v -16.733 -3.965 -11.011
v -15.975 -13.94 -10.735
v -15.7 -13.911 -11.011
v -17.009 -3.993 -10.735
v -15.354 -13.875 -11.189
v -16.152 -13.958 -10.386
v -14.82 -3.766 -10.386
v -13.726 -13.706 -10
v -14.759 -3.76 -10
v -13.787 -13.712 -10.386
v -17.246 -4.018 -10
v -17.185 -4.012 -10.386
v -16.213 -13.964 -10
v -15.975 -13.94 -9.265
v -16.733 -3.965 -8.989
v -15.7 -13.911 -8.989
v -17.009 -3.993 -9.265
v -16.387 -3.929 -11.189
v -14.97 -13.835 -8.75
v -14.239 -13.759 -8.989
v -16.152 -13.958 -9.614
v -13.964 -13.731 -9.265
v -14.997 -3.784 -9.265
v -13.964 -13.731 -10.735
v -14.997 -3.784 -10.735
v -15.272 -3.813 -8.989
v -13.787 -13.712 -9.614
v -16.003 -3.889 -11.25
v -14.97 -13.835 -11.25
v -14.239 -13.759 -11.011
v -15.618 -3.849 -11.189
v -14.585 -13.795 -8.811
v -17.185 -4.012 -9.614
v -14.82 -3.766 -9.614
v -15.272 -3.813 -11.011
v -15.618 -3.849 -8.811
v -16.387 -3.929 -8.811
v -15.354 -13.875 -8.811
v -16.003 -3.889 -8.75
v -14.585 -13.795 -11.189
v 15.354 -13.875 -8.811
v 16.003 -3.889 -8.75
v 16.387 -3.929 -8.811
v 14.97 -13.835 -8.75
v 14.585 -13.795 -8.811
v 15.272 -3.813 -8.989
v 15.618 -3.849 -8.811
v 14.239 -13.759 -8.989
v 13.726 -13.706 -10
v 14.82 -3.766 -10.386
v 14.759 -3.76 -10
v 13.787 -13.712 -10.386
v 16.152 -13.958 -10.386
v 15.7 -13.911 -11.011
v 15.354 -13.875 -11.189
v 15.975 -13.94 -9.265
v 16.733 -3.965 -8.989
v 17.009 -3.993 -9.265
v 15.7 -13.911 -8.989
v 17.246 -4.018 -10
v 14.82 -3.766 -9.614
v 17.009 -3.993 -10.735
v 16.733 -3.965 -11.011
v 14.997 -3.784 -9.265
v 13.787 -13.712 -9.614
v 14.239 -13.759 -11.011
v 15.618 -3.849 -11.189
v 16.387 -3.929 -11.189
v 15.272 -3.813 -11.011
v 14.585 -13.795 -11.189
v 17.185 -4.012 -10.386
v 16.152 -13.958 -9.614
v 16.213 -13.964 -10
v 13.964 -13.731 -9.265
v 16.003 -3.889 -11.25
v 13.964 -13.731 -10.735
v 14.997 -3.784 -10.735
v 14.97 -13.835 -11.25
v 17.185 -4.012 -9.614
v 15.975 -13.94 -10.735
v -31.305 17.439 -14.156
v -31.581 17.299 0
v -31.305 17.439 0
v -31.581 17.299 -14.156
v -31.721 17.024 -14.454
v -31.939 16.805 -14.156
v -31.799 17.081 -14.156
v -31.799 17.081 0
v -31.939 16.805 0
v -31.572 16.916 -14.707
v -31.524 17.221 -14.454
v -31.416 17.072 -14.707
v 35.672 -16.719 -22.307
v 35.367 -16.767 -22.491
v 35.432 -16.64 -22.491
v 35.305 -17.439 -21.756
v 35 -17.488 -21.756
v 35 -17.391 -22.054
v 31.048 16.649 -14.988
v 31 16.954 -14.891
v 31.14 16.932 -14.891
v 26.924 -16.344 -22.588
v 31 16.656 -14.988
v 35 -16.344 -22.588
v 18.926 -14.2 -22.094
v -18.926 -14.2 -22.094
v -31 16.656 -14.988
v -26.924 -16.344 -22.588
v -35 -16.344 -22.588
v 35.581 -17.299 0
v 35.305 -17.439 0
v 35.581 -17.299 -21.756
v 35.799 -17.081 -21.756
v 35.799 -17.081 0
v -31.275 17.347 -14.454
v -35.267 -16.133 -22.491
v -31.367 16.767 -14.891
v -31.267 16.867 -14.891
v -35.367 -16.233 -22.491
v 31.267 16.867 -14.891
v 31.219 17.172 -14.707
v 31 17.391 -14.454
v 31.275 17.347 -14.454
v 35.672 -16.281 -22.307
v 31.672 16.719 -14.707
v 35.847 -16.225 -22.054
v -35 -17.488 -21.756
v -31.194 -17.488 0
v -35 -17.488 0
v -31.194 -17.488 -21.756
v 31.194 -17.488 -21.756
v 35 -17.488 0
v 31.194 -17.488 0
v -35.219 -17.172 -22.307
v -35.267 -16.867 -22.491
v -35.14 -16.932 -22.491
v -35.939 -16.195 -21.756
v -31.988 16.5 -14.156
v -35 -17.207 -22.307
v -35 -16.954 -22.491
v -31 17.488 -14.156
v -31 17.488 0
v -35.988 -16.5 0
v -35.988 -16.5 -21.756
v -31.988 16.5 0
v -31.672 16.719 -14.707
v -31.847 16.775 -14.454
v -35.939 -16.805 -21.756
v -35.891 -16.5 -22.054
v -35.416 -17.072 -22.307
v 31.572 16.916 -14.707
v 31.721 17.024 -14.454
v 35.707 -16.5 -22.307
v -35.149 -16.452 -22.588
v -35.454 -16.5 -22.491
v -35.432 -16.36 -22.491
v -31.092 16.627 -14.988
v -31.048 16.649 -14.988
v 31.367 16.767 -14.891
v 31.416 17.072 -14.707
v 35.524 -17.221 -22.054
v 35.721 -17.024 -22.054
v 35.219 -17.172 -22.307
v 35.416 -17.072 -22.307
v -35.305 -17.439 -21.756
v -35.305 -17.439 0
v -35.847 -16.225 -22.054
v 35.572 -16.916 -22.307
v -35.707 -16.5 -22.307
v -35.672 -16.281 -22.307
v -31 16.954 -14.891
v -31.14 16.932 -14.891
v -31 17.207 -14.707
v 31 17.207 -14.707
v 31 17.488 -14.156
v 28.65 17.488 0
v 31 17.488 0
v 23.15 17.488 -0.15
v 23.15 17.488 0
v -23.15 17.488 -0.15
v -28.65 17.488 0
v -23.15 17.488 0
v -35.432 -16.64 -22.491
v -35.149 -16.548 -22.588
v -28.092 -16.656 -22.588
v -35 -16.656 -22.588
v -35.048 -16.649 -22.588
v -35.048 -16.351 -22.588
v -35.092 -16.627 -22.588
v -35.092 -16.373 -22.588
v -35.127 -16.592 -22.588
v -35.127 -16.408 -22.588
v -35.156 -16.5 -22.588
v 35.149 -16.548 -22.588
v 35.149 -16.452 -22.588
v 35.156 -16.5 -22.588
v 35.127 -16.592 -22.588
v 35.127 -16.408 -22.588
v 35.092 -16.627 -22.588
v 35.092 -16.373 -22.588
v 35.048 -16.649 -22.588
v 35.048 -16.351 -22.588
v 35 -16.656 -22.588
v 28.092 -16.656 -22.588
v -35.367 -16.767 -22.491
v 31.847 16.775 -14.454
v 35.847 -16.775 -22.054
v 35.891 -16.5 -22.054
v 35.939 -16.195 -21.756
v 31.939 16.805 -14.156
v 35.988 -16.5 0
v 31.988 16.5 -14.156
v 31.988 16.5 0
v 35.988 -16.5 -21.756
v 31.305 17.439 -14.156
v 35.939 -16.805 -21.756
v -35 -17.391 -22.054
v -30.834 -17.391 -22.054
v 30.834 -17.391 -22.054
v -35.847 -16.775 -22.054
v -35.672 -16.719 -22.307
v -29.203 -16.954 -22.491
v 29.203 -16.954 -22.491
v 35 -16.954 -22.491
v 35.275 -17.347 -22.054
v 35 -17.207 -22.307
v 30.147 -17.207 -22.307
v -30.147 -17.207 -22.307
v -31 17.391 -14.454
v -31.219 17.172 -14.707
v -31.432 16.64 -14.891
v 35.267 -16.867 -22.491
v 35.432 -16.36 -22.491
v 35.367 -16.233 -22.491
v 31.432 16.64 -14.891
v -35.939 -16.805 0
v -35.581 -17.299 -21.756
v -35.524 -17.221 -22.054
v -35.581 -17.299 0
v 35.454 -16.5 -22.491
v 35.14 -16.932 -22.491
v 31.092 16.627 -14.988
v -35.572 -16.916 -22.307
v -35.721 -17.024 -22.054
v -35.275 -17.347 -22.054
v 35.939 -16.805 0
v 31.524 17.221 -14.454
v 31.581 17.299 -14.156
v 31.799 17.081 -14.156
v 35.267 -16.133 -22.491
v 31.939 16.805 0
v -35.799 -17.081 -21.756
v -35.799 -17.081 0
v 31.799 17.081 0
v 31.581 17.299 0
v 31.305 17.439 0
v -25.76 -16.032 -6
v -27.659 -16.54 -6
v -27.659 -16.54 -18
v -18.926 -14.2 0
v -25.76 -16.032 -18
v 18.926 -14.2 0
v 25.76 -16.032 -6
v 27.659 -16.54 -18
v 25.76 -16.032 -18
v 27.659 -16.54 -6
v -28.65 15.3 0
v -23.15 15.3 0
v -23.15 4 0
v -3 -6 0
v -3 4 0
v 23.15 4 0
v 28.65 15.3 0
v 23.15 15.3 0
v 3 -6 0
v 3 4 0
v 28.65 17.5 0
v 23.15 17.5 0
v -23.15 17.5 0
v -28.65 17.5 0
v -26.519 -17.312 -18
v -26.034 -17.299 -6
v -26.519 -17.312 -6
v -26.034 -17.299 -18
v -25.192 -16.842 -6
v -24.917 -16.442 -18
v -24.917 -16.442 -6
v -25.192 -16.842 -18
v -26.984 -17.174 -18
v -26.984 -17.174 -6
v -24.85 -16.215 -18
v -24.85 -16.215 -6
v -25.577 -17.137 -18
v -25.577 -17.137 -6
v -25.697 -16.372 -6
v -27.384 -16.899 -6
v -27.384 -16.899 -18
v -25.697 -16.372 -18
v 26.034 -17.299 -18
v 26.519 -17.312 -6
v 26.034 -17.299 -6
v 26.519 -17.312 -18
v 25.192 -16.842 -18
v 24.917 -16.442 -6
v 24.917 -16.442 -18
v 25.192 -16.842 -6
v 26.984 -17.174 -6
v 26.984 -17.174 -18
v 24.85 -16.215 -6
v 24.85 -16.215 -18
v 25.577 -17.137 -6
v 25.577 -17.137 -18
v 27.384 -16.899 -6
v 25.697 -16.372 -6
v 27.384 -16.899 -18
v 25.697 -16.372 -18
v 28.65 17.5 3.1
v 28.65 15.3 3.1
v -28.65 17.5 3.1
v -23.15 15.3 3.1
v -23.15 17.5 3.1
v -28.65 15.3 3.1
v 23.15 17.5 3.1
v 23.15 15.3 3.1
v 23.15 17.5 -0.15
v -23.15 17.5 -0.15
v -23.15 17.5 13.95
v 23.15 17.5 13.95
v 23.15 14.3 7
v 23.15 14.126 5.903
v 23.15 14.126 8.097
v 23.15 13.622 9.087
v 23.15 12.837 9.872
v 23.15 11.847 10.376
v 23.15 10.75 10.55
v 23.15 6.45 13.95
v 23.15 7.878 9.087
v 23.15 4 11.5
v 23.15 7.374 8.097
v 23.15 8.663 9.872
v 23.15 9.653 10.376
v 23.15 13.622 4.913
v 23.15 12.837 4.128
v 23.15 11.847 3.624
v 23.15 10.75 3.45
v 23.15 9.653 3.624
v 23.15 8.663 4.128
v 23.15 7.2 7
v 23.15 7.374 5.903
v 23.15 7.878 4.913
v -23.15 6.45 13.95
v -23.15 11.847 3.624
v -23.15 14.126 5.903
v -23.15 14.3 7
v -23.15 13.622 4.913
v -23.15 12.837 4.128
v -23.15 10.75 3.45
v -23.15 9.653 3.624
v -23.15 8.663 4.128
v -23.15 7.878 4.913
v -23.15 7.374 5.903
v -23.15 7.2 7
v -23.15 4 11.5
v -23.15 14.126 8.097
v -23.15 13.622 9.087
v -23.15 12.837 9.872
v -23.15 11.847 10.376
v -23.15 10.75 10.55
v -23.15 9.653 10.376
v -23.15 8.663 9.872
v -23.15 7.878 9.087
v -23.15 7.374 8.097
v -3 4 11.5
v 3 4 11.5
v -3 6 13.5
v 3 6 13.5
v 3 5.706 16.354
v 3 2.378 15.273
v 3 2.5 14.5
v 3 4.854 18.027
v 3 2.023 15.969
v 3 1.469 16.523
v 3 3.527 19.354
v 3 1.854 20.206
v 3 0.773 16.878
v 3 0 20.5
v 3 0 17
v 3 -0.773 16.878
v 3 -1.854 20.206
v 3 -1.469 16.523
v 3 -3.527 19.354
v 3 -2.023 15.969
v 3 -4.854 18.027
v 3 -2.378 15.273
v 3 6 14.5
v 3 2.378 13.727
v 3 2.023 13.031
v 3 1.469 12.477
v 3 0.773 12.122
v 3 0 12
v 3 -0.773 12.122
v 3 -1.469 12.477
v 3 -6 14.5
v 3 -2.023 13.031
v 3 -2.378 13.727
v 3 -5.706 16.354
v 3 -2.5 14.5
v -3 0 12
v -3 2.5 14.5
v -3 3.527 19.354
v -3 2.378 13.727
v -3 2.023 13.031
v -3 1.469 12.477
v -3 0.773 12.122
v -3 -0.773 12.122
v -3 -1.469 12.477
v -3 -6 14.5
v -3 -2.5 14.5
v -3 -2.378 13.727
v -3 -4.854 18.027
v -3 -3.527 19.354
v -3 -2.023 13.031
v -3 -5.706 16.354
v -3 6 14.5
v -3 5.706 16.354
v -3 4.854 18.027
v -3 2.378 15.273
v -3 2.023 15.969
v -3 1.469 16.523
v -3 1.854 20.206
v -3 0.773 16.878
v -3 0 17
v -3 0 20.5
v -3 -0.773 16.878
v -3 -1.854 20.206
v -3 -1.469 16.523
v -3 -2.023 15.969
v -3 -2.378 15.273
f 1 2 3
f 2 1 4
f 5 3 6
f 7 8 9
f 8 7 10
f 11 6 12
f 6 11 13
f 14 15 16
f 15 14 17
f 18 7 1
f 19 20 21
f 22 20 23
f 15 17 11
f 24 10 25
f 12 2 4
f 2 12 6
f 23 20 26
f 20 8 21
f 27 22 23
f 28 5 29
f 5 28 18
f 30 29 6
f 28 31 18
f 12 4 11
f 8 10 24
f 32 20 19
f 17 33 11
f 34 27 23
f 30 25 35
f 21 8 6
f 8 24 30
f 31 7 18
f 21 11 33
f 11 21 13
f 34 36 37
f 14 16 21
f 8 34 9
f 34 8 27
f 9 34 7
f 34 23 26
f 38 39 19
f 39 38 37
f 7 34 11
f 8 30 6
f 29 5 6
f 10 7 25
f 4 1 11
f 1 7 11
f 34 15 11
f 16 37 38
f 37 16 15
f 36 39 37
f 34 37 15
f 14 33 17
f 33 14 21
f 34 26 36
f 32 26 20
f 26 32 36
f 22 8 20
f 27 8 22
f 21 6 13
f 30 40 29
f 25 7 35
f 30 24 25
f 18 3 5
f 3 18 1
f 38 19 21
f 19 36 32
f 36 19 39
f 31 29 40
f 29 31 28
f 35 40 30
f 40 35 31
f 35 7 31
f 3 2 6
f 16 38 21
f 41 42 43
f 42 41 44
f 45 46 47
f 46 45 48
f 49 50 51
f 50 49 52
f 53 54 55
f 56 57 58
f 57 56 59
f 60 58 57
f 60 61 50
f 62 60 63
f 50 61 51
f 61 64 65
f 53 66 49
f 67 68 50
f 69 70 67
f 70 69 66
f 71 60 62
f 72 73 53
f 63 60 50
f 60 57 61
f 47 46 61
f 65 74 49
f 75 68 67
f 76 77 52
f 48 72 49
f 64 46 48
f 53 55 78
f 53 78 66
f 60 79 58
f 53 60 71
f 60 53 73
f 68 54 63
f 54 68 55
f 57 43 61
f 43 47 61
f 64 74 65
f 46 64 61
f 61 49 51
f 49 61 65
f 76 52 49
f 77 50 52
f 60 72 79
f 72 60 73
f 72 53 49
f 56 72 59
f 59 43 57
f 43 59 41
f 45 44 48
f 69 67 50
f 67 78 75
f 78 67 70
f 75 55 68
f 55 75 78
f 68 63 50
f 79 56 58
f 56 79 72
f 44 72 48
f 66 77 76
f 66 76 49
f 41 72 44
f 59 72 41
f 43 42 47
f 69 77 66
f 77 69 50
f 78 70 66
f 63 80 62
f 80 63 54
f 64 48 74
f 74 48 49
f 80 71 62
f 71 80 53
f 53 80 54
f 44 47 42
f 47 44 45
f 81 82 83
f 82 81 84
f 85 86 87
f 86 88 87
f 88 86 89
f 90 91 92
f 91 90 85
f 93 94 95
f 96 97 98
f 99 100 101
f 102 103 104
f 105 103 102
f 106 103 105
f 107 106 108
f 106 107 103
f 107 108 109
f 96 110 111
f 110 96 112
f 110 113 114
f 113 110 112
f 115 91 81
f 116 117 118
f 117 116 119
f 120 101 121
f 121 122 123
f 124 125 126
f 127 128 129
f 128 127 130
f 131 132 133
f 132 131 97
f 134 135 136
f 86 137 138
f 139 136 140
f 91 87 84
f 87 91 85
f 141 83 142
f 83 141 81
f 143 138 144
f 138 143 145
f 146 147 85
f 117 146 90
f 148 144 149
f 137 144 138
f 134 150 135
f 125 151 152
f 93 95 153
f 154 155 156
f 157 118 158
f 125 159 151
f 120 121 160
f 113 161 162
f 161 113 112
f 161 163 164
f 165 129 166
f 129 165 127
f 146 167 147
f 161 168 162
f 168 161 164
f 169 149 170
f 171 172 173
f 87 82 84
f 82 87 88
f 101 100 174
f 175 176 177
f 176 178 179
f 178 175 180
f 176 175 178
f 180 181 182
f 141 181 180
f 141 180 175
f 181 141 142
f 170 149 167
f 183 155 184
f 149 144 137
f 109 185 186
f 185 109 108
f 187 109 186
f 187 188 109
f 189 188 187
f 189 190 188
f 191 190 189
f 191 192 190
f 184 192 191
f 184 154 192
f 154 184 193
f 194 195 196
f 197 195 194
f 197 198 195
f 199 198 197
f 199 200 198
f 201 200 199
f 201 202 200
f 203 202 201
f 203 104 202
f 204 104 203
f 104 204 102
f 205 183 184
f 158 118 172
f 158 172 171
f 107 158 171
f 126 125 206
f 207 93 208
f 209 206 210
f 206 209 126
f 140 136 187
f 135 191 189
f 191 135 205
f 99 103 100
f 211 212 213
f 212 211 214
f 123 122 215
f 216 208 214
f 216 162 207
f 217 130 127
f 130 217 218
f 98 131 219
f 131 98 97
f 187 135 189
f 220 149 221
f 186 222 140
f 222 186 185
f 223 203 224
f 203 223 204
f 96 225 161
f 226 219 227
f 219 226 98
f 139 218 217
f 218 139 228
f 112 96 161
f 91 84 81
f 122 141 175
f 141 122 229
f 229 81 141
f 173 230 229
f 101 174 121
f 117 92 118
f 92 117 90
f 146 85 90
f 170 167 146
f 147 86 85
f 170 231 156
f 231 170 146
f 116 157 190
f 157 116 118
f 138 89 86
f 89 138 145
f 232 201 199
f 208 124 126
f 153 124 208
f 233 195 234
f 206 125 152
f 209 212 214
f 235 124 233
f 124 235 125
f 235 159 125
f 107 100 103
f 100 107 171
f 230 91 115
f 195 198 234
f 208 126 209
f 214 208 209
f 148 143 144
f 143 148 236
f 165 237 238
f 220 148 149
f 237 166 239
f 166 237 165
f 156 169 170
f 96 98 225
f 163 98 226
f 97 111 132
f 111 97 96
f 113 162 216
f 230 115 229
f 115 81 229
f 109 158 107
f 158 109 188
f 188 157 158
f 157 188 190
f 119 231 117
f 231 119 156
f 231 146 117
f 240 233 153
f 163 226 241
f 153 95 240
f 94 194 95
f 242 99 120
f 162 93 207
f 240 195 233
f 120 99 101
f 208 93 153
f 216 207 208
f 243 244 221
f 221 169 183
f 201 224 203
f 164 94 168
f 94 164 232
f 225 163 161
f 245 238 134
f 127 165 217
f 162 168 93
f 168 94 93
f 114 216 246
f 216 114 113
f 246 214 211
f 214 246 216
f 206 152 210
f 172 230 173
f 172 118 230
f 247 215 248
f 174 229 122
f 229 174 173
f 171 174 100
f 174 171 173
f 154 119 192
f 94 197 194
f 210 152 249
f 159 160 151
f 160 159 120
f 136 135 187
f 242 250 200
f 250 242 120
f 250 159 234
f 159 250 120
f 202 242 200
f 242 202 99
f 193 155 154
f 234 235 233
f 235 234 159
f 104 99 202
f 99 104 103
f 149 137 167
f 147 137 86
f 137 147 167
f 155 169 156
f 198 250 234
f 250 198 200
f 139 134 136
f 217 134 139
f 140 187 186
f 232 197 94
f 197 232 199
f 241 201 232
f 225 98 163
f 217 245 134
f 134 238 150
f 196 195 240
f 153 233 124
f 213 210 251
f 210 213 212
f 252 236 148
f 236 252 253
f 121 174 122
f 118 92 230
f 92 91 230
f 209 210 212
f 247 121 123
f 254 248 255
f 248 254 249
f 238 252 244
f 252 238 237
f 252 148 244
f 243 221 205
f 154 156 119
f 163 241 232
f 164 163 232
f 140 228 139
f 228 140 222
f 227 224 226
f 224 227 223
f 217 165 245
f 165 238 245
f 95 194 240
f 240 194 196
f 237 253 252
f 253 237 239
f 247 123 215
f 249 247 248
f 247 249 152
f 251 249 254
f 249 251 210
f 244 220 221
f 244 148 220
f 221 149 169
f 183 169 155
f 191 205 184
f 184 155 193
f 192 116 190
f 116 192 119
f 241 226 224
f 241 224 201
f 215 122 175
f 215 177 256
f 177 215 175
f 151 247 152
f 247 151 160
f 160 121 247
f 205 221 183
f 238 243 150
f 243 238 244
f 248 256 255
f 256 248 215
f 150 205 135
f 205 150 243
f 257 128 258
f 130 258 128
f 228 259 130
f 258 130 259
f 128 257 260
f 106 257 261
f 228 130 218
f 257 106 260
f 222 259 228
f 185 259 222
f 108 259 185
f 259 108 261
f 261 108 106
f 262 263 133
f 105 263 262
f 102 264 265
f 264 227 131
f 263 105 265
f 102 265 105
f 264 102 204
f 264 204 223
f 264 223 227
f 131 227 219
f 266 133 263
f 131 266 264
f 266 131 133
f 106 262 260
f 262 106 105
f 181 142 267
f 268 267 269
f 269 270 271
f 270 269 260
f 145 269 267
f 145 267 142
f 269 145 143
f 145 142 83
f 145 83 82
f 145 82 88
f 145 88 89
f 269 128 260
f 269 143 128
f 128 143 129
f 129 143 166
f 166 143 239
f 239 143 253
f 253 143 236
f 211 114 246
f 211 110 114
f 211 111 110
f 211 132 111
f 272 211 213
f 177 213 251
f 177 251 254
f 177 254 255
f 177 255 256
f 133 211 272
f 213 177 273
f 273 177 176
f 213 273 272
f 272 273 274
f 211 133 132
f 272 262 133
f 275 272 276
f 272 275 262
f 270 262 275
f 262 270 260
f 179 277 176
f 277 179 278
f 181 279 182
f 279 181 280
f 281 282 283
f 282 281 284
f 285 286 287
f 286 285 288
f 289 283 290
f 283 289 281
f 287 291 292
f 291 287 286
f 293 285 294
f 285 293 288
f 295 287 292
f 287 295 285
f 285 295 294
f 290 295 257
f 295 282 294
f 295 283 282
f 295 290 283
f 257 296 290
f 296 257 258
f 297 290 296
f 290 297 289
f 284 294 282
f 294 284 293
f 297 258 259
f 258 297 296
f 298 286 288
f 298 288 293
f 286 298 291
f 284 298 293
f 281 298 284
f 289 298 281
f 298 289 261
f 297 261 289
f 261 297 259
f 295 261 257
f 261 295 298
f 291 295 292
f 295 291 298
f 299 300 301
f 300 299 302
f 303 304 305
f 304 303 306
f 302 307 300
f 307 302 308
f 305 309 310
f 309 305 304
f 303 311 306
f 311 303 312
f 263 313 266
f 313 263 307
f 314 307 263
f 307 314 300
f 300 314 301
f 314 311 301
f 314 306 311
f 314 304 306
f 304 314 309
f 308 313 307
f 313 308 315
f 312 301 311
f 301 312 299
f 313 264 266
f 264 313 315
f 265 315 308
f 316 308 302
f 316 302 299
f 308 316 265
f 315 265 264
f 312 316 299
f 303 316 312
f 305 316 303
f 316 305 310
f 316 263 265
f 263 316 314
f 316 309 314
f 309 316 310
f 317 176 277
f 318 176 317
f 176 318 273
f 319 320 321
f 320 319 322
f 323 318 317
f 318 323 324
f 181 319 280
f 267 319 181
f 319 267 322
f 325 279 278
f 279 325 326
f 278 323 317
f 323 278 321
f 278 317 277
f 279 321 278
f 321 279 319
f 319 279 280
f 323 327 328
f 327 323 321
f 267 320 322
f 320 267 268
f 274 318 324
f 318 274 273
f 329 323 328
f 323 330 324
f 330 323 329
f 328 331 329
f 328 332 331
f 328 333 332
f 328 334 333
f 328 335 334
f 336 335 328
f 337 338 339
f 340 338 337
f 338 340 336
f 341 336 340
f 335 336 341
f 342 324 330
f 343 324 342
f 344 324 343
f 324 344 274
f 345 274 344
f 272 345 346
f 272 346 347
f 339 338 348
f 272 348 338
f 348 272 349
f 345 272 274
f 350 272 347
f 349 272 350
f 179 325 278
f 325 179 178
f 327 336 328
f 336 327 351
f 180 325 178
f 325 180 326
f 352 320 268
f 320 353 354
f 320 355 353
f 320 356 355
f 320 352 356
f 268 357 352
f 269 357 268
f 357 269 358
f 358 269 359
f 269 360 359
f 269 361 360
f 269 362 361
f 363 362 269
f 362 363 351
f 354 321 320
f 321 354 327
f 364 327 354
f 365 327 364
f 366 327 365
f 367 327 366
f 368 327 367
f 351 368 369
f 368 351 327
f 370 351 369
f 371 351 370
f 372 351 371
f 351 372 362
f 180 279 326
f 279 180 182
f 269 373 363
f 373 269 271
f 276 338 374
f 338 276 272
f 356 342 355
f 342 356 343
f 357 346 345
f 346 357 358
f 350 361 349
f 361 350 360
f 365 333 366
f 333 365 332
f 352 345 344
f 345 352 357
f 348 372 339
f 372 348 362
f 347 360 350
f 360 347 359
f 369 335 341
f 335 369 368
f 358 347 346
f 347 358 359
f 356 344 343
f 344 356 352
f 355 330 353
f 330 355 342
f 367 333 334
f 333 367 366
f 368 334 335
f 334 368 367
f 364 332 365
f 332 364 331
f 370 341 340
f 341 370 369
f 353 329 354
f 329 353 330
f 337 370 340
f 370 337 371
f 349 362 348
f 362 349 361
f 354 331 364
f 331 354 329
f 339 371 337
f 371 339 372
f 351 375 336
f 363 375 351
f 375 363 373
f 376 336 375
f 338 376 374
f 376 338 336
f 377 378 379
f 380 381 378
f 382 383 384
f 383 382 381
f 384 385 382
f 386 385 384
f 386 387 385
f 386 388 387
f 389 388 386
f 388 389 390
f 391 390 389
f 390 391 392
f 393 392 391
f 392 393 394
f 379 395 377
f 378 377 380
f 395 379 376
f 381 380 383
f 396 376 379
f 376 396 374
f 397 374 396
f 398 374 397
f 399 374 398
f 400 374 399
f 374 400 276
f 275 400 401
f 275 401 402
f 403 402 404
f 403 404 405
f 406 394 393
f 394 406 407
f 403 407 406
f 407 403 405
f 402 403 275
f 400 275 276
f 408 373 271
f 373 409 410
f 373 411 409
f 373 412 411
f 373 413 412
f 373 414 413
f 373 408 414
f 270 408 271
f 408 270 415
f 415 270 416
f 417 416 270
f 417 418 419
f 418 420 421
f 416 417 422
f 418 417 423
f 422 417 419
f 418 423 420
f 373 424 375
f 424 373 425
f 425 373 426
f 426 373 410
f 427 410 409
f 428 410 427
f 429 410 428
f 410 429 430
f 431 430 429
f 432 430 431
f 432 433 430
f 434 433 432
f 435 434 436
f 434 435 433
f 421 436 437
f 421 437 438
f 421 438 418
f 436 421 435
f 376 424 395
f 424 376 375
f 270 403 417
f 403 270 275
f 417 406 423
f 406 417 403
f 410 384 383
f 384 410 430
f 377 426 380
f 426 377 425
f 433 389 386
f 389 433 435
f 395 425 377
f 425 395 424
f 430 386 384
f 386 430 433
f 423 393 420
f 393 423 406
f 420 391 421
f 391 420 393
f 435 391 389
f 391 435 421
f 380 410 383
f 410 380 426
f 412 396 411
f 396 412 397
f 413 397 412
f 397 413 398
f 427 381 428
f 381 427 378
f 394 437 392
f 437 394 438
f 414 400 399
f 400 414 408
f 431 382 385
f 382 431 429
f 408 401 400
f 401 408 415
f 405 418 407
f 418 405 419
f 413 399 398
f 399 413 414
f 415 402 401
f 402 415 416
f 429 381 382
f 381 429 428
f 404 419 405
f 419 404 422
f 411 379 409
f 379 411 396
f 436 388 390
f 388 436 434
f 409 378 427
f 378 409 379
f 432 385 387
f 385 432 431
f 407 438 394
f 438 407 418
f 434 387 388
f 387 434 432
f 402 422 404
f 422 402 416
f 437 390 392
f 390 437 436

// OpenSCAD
use <myShapes.scad>


$vpt=[ 0,0,0 ];
$vpr=[ 55.00, 0.00, 25.00 ];
$vpd=213.38;


$fn=20;
fudge=0.1;

showBody=true;
showHinge=true;


bdDims=[72,35,45.2];
lidRad=290/2;
lidCenterOffset=-lidRad-bdDims.y/2+segmentHght(bdDims.x,lidRad);
rad=1;


if (showBody) body();
if (showHinge) hinge();
  
module body(){  
  difference(){
    hull() for (ix=[-1,1],iz=[-1,1]){
      translate([ix*(64/2-rad),(35/2-rad),iz*(15-rad)]) sphere(rad);
      translate([ix*(72/2-rad),-(35/2-rad),iz*(22.6-rad)]) sphere(rad);
    }
    //lid cutOut
    translate([0,lidCenterOffset,-(bdDims.z+fudge)/2]) 
      rotate(90-45/2) linear_extrude(bdDims.z+fudge) arc(r=lidRad,angle=45);  
    //half
    translate([0,0,(bdDims.z+fudge)/2]) cube(bdDims+[fudge,fudge,fudge],true);  
    //drills
    for (im=[0,1])
      translate([0,lidCenterOffset,0])
      mirror([im,0,0]){
        rotate(segmentAngle(30/2,lidRad)) 
          translate([0,lidRad-fudge,-10]) 
            rotate([-90,0,0]) cylinder(d=2.5,h=10);
      }
  }
  translate([0,(bdDims.y-2.2)/2,3.1/2]) cube([57.3,2.2,3.1],true);
  
  //hooks
  for (im=[0,1])
    translate([0,lidCenterOffset,0])
      mirror([im,0,0])
        rotate(segmentAngle(53/2,lidRad))
          translate([0,lidRad-fudge,-12]) hook();
  
  module hook(){
    difference(){
      union(){
        for (iy=[-1,1]) translate([0,iy*(3.7-3.1)/2,0]) cylinder(d=3.1,h=12,center=true);
        cube([3.1,3.7-3.1,12],true);
      }
      translate([-((1+fudge)-3.1-fudge)/2,0,0]) cube([1+fudge,2,12+fudge],true);
    }
  }
}

module hinge(){
  ovDims=[46.3,13.5,14];
  domeDims=[6,12,20.5];
  domeHght=domeDims.z-domeDims.y/2;
  wallThck=3;
  
  //main Hinge
  translate([0,(bdDims.y-ovDims.y)/2,ovDims.z/2])   
    difference(){
      translate([0,0,-fudge]) cube(ovDims+[0,0,fudge],true);
      rotate([0,90,0]) cylinder(d=7.1,h=ovDims.x+fudge,center=true);
      *translate([0,-(wallThck+fudge)/2,]) 
        cube([(ovDims.x-wallThck*2),ovDims.y-wallThck+fudge,ovDims.z+fudge],true);
      translate([0,-ovDims.y/2,ovDims.z/2]) rotate([0,90,0]) 
        cylinder(d=5,h=ovDims.x+fudge,center=true,$fn=4);
  }
  
  //dome
  difference(){
    union(){
      translate([0,0,domeHght/2]) cube([domeDims.x,domeDims.y,domeHght],true);
      translate([0,0,domeHght]) rotate([0,90,0]) cylinder(d=domeDims.y,h=domeDims.x,center=true);
    }
    translate([0,0,domeHght]) rotate([0,90,0]) cylinder(d=5,h=domeDims.x+fudge,center=true);
  }

  
}


function segmentHght(s,r)=r-0.5*sqrt(4*pow(r,2)-pow(s,2));
function segmentAngle(s,r)=2*asin(s/(2*r));
